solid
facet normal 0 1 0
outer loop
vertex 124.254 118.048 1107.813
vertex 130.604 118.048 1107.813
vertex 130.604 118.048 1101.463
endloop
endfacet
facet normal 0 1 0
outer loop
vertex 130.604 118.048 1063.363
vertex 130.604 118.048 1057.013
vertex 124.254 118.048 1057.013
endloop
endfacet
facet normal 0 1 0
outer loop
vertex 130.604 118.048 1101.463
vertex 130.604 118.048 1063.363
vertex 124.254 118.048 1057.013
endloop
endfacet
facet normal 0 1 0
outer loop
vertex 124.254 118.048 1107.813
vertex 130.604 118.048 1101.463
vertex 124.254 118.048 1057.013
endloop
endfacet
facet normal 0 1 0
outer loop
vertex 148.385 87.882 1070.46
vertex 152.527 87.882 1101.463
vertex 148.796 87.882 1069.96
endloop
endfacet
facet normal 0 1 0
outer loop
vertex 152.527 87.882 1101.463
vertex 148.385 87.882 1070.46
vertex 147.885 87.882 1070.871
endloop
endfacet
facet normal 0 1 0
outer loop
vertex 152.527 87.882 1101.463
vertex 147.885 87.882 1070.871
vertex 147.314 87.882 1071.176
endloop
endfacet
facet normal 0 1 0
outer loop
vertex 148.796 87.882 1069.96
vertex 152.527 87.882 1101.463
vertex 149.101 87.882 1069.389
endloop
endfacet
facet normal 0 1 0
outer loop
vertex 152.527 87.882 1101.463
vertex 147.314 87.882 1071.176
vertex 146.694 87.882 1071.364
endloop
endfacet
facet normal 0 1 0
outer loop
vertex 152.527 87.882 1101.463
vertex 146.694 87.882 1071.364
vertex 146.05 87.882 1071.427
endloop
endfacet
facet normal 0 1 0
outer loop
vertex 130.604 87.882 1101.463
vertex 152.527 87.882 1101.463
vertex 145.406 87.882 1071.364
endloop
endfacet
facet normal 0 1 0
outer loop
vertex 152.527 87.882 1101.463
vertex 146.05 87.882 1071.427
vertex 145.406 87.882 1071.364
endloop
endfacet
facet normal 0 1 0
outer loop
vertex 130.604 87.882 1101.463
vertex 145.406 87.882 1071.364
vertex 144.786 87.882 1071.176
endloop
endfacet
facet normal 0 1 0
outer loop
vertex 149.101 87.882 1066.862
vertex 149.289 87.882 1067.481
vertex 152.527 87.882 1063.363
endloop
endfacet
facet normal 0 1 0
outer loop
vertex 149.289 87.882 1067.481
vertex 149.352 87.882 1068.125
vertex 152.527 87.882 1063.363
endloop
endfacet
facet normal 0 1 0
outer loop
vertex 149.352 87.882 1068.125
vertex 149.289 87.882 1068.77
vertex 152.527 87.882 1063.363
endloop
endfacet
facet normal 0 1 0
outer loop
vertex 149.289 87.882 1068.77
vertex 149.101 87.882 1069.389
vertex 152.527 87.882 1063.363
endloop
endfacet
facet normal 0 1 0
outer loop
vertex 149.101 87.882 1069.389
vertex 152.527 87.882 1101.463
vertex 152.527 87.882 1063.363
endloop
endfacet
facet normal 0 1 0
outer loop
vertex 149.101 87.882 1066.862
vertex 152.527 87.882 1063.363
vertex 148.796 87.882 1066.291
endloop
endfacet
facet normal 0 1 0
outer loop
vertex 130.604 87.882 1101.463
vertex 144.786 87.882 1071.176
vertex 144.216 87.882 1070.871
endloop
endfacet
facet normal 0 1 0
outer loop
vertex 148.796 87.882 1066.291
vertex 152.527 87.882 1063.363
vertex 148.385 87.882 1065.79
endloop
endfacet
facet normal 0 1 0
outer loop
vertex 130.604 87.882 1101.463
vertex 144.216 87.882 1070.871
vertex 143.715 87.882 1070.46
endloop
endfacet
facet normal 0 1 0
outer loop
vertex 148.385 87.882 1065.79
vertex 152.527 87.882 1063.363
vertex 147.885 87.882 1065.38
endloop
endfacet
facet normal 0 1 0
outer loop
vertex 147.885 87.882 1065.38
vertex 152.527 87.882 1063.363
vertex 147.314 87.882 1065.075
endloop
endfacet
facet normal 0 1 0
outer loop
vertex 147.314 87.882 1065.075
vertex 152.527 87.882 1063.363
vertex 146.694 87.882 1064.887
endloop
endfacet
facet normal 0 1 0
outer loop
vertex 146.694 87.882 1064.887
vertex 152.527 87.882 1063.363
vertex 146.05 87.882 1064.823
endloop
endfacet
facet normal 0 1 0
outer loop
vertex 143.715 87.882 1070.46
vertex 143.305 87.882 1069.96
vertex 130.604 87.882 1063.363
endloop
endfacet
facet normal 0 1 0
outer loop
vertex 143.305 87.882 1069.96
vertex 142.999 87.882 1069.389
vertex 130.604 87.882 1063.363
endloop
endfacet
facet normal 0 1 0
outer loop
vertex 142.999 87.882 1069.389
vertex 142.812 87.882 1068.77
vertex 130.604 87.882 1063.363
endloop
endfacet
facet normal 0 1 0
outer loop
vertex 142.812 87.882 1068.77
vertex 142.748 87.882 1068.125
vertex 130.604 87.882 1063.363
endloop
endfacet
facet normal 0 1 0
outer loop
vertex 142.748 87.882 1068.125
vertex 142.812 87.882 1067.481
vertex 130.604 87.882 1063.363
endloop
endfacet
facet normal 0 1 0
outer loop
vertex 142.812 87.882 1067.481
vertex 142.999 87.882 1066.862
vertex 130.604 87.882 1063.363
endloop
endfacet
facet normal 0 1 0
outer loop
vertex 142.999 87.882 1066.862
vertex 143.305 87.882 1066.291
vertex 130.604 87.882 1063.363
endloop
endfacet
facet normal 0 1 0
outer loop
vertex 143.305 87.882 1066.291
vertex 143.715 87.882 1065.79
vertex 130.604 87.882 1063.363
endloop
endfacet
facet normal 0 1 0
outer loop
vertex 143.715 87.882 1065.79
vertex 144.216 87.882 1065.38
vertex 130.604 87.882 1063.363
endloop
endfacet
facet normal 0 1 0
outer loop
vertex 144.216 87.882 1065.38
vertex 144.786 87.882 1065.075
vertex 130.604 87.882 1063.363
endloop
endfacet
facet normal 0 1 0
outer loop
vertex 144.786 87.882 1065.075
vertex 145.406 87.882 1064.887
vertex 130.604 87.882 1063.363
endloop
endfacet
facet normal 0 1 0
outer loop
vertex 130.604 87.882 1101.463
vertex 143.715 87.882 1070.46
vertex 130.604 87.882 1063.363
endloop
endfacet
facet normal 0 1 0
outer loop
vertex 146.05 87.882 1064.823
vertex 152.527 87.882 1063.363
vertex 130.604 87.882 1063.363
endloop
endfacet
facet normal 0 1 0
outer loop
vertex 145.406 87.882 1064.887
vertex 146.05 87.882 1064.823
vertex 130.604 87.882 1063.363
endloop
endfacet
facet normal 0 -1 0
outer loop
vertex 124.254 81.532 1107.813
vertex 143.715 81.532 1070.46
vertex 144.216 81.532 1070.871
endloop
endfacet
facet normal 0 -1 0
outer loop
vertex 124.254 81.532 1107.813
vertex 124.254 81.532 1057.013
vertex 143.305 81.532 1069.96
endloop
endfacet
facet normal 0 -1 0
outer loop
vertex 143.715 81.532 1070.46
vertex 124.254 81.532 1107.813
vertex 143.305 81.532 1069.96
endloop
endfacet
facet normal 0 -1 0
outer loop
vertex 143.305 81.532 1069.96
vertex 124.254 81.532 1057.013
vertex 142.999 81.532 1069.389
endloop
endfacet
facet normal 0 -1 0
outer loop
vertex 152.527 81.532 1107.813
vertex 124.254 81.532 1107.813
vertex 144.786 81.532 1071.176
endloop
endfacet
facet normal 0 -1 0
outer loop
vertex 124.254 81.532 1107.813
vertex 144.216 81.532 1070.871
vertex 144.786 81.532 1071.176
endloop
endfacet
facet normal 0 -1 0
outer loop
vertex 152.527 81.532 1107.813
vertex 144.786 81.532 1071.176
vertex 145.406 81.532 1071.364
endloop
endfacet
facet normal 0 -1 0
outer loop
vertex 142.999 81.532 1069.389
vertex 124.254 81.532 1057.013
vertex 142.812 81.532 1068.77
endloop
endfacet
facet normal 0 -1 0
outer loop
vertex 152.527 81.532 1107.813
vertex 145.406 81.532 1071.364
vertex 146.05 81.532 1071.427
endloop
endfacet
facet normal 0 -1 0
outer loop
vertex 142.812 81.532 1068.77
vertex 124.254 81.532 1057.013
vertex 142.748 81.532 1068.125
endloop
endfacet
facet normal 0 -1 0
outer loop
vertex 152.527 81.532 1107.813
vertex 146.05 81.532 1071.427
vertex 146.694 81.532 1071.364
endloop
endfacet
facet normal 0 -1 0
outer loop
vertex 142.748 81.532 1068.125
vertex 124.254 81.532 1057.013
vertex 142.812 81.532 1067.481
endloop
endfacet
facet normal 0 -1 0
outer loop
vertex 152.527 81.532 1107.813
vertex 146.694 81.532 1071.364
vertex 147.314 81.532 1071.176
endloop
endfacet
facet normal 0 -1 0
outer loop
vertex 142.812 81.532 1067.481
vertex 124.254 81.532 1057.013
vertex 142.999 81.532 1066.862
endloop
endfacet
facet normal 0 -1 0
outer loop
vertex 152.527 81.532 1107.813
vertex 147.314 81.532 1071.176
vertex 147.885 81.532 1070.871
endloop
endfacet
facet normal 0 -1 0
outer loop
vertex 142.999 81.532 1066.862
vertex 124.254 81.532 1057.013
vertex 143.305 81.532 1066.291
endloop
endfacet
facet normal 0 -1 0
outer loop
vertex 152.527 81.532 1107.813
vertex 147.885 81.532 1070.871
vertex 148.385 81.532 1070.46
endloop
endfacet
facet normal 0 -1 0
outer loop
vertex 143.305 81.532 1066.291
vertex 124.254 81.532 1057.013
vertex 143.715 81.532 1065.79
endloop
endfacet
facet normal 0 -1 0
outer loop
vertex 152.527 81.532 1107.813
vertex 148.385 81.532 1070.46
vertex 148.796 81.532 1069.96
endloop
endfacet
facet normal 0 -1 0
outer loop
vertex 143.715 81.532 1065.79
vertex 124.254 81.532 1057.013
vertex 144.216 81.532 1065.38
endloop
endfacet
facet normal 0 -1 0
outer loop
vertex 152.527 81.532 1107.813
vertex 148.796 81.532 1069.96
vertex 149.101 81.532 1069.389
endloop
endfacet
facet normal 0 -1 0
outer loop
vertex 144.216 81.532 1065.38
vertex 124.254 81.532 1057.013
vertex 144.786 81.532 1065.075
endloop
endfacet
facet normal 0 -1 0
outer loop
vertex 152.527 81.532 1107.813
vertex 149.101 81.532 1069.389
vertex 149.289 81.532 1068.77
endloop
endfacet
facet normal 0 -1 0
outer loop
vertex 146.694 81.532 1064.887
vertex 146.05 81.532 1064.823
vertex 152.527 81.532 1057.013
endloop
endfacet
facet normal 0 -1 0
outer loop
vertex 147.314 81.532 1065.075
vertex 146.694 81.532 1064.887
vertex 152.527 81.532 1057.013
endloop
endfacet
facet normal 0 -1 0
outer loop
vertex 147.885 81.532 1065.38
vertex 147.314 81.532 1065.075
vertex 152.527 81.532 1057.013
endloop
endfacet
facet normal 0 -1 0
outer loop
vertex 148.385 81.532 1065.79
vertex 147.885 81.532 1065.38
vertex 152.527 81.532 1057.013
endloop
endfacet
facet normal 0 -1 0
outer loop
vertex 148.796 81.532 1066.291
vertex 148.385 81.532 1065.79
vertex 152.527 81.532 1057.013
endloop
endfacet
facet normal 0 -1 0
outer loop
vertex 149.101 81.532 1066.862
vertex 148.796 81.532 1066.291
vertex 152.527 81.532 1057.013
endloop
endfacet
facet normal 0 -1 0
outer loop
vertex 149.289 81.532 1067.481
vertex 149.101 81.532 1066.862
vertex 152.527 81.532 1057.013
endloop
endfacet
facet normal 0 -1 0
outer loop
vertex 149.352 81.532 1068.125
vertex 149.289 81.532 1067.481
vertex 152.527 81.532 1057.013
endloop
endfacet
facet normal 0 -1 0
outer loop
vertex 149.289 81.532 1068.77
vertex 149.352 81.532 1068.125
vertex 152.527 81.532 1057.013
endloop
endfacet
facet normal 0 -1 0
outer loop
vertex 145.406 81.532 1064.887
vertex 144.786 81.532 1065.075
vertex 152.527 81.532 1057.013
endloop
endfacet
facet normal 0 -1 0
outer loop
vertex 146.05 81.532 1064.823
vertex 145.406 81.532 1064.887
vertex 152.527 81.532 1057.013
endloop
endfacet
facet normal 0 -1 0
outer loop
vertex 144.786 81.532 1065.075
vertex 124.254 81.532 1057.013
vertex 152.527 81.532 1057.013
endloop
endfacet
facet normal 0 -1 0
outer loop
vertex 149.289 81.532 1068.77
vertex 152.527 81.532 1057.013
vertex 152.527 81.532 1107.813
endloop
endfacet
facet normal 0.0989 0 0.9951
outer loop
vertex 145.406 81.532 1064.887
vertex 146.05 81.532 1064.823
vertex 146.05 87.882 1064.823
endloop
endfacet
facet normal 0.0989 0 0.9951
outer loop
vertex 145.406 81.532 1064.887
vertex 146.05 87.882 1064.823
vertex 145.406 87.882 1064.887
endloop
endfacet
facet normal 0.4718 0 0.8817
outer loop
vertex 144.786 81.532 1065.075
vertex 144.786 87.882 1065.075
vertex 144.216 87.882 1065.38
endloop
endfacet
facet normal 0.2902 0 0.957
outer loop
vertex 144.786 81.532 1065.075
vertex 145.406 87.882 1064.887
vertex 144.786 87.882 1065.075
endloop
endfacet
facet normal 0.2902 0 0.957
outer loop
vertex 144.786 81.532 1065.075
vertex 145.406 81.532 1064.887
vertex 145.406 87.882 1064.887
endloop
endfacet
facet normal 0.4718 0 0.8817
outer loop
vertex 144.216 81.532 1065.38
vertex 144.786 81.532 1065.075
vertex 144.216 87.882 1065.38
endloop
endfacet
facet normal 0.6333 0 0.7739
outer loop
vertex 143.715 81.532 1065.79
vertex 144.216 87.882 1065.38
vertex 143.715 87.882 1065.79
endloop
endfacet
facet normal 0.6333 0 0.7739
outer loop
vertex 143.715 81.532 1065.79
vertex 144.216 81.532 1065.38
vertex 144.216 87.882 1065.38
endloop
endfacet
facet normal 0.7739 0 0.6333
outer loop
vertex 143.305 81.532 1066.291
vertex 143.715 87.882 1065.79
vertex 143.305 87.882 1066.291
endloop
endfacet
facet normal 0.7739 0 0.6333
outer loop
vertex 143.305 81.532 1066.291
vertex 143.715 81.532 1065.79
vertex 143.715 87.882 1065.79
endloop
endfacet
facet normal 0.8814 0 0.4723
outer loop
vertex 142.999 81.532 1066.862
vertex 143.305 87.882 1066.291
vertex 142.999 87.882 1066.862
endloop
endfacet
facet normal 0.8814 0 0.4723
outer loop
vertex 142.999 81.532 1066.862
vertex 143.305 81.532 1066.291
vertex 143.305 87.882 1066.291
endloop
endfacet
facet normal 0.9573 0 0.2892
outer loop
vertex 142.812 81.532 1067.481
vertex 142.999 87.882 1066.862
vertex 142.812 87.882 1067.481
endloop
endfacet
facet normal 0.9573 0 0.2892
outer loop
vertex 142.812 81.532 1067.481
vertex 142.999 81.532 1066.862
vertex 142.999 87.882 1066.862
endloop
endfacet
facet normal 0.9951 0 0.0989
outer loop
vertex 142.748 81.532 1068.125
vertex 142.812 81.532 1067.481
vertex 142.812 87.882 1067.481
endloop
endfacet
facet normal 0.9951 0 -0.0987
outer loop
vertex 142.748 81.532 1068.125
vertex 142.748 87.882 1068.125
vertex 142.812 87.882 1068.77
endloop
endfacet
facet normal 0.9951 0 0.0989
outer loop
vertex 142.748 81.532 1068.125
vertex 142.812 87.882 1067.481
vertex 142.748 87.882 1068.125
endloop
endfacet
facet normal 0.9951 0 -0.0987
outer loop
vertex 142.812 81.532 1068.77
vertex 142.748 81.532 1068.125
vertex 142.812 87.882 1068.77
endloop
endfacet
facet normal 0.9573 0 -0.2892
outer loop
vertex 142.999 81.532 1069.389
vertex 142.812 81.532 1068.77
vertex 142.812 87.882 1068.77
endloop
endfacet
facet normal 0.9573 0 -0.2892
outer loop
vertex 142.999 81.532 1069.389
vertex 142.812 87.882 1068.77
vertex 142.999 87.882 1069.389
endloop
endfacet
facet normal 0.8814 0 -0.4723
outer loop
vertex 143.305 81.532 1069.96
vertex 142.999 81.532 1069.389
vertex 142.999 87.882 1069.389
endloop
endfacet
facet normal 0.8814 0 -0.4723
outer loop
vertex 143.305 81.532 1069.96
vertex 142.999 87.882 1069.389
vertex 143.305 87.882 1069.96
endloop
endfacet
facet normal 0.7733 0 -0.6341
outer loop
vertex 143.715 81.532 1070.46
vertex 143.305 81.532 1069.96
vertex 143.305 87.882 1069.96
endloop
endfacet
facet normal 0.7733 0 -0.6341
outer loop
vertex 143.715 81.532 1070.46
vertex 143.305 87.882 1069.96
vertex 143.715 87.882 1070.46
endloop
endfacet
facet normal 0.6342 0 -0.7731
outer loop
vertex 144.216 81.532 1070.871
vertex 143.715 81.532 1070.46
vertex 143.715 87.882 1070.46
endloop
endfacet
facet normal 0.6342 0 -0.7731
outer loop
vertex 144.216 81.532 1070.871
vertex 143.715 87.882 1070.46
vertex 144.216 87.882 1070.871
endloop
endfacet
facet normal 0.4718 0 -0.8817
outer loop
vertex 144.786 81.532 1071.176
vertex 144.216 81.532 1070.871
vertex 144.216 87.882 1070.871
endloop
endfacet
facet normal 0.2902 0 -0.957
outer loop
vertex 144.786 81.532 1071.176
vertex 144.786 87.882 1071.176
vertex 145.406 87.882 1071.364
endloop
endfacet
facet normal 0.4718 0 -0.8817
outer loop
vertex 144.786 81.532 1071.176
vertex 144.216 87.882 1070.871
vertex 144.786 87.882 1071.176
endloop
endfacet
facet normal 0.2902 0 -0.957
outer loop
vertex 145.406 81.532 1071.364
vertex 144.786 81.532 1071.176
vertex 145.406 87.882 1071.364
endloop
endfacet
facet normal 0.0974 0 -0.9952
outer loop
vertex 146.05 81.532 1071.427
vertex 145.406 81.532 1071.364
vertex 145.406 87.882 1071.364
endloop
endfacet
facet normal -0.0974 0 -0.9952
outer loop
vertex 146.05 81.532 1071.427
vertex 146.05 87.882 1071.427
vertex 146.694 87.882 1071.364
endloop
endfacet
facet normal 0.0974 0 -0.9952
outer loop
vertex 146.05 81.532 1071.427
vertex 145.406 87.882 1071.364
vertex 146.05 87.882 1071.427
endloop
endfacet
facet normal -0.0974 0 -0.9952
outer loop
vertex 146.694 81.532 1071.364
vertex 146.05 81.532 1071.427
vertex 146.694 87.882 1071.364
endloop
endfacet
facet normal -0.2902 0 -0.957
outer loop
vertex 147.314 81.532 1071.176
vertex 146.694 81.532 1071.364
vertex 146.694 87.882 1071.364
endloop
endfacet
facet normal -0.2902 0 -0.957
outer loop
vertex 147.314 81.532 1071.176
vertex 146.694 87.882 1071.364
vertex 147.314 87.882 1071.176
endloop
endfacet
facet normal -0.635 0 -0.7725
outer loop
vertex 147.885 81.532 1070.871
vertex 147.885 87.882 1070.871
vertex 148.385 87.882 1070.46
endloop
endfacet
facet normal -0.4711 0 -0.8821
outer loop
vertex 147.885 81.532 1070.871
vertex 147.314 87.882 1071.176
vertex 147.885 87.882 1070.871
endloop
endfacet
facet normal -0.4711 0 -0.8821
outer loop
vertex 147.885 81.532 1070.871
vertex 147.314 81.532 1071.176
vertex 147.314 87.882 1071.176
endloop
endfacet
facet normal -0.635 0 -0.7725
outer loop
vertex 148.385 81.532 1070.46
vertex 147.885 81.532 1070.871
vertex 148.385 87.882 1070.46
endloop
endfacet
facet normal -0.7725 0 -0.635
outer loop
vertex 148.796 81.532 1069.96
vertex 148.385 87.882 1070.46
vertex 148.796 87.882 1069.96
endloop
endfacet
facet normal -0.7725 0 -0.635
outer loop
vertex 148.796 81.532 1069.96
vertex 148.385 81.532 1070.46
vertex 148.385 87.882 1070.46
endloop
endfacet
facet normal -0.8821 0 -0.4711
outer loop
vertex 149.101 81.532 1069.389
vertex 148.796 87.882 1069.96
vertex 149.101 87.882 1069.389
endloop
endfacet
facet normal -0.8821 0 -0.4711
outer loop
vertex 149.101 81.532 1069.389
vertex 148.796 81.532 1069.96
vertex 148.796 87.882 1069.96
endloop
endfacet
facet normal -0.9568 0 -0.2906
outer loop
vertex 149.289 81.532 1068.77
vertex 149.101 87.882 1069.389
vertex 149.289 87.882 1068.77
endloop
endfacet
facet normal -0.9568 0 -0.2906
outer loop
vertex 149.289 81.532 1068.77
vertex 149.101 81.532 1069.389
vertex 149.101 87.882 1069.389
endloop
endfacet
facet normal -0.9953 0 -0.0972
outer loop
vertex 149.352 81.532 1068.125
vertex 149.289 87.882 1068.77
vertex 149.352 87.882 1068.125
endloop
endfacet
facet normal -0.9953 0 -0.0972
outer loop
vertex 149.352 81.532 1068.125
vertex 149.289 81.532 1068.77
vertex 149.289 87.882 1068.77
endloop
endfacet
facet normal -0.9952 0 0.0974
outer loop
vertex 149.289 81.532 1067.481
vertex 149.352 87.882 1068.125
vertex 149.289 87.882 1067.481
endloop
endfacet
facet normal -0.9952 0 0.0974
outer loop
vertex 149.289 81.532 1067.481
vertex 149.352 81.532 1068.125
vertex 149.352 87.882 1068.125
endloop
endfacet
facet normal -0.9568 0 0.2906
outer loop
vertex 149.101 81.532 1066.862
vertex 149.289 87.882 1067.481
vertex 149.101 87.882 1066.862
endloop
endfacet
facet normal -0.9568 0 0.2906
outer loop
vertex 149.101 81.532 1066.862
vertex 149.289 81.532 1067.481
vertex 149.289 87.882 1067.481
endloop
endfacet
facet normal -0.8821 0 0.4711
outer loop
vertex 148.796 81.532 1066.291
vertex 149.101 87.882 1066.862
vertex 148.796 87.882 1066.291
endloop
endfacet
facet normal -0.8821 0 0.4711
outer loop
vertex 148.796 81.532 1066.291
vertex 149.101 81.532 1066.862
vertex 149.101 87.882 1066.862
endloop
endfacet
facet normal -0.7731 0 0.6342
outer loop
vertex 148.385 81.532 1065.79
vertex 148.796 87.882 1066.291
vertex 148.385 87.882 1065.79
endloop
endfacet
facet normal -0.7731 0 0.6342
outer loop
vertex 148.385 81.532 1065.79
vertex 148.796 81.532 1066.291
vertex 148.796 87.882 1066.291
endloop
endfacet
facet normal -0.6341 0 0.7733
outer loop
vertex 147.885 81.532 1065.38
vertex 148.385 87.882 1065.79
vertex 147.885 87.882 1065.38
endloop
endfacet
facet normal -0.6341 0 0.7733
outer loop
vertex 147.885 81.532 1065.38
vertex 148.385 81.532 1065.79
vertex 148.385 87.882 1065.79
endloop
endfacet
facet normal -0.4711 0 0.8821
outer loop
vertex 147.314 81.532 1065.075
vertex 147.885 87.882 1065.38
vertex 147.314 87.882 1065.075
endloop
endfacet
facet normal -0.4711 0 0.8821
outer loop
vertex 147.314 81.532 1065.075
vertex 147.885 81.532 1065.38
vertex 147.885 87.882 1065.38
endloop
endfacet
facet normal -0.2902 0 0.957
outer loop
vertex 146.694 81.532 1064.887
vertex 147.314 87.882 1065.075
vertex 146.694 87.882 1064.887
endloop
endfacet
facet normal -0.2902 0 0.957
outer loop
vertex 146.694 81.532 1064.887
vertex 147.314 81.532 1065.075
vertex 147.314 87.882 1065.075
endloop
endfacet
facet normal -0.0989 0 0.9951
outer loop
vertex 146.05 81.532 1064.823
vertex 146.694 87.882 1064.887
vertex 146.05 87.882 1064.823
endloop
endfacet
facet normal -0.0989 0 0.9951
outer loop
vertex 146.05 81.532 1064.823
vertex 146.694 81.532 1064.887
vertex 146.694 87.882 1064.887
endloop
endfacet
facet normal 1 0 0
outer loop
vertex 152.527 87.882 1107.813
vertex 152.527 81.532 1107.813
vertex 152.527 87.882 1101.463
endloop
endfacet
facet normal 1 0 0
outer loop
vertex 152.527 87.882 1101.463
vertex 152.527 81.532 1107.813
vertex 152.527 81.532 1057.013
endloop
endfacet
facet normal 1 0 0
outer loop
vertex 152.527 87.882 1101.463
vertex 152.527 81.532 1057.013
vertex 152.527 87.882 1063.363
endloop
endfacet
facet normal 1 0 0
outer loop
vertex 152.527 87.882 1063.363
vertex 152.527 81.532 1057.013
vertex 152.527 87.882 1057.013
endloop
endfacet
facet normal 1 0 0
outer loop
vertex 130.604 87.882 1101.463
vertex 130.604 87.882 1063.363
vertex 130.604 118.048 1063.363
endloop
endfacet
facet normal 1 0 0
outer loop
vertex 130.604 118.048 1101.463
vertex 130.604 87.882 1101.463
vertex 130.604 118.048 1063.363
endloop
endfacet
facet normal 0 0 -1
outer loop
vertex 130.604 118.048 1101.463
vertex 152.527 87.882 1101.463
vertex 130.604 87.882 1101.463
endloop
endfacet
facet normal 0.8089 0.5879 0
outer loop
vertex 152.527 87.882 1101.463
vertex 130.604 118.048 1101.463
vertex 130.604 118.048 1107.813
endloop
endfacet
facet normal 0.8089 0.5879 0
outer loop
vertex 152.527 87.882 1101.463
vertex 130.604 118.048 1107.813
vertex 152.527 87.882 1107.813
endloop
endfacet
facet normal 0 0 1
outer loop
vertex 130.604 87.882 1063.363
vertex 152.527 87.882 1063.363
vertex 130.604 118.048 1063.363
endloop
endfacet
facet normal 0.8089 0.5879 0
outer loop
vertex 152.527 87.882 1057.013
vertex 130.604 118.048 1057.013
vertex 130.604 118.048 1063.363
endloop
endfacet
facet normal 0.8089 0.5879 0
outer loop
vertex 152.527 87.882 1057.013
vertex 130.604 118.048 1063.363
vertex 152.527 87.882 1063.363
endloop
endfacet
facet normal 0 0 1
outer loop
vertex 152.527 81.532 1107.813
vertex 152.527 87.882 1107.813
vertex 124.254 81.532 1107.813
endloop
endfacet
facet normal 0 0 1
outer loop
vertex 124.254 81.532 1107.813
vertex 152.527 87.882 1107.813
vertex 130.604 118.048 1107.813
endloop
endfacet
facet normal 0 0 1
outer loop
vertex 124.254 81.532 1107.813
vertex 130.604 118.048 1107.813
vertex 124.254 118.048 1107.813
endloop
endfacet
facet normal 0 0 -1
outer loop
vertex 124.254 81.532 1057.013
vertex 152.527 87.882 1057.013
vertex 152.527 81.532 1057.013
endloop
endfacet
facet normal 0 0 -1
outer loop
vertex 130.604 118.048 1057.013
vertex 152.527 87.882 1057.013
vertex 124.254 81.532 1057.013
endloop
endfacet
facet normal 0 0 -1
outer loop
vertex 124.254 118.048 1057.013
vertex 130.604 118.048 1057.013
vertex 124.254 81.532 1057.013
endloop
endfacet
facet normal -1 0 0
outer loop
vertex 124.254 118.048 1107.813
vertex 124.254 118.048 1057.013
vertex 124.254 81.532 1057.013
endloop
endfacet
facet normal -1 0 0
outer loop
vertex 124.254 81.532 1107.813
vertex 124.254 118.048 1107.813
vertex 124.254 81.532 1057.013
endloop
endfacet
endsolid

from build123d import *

# Parameters (mm, degrees)
BOSS_EXTRUDE1_START     = 1057.012834
BOSS_EXTRUDE1_DEPTH     = 50.8
CUT_EXTRUDE1_DEPTH      = 1125.4772971
CUT_EXTRUDE1_DEPTH_BACK = 1125.4772971
SKETCH2_R               = 3.302
BOSS_EXTRUDE2_START     = 1057.012834
BOSS_EXTRUDE2_DEPTH     = 6.35
BOSS_EXTRUDE3_START     = 1101.462834
BOSS_EXTRUDE3_DEPTH     = 6.35


with BuildPart() as part:
    # Sketch1 → Boss-Extrude1 (new body)
    with BuildSketch(Plane.XY.offset(BOSS_EXTRUDE1_START)):
        Polygon((152.527062484, 81.531574554), (152.527062484, 87.881574554), (130.604002291, 87.881574554), (130.604002291, 118.048344881), (124.254002291, 118.048344881), (124.254002291, 81.531574554), align=None)
    extrude(amount=BOSS_EXTRUDE1_DEPTH)

    # Sketch2 → Cut-Extrude1 (cut, two sides: drawn at the far end of the back side and taken through both)
    with BuildSketch(Plane(origin=(0, 0, 0), x_dir=(1, 0, 0), z_dir=(0, 1, 0)).offset(-CUT_EXTRUDE1_DEPTH_BACK)):
        with Locations(Location((146.050062484, -1068.125334154, 0), (0, 0, 90))):
            Circle(SKETCH2_R)
    extrude(amount=CUT_EXTRUDE1_DEPTH + CUT_EXTRUDE1_DEPTH_BACK, mode=Mode.SUBTRACT)

    # Sketch3 → Boss-Extrude2 (add)
    with BuildSketch(Plane.XY.offset(BOSS_EXTRUDE2_START)):
        Polygon((130.604002291, 118.048344881), (152.527062484, 87.881574554), (130.604002291, 87.881574554), align=None)
    extrude(amount=BOSS_EXTRUDE2_DEPTH)

    # Sketch3<2> → Boss-Extrude3 (add)
    with BuildSketch(Plane.XY.offset(BOSS_EXTRUDE3_START)):
        Polygon((130.604002291, 118.048344881), (152.527062484, 87.881574554), (130.604002291, 87.881574554), align=None)
    extrude(amount=BOSS_EXTRUDE3_DEPTH)


solid = part.part
